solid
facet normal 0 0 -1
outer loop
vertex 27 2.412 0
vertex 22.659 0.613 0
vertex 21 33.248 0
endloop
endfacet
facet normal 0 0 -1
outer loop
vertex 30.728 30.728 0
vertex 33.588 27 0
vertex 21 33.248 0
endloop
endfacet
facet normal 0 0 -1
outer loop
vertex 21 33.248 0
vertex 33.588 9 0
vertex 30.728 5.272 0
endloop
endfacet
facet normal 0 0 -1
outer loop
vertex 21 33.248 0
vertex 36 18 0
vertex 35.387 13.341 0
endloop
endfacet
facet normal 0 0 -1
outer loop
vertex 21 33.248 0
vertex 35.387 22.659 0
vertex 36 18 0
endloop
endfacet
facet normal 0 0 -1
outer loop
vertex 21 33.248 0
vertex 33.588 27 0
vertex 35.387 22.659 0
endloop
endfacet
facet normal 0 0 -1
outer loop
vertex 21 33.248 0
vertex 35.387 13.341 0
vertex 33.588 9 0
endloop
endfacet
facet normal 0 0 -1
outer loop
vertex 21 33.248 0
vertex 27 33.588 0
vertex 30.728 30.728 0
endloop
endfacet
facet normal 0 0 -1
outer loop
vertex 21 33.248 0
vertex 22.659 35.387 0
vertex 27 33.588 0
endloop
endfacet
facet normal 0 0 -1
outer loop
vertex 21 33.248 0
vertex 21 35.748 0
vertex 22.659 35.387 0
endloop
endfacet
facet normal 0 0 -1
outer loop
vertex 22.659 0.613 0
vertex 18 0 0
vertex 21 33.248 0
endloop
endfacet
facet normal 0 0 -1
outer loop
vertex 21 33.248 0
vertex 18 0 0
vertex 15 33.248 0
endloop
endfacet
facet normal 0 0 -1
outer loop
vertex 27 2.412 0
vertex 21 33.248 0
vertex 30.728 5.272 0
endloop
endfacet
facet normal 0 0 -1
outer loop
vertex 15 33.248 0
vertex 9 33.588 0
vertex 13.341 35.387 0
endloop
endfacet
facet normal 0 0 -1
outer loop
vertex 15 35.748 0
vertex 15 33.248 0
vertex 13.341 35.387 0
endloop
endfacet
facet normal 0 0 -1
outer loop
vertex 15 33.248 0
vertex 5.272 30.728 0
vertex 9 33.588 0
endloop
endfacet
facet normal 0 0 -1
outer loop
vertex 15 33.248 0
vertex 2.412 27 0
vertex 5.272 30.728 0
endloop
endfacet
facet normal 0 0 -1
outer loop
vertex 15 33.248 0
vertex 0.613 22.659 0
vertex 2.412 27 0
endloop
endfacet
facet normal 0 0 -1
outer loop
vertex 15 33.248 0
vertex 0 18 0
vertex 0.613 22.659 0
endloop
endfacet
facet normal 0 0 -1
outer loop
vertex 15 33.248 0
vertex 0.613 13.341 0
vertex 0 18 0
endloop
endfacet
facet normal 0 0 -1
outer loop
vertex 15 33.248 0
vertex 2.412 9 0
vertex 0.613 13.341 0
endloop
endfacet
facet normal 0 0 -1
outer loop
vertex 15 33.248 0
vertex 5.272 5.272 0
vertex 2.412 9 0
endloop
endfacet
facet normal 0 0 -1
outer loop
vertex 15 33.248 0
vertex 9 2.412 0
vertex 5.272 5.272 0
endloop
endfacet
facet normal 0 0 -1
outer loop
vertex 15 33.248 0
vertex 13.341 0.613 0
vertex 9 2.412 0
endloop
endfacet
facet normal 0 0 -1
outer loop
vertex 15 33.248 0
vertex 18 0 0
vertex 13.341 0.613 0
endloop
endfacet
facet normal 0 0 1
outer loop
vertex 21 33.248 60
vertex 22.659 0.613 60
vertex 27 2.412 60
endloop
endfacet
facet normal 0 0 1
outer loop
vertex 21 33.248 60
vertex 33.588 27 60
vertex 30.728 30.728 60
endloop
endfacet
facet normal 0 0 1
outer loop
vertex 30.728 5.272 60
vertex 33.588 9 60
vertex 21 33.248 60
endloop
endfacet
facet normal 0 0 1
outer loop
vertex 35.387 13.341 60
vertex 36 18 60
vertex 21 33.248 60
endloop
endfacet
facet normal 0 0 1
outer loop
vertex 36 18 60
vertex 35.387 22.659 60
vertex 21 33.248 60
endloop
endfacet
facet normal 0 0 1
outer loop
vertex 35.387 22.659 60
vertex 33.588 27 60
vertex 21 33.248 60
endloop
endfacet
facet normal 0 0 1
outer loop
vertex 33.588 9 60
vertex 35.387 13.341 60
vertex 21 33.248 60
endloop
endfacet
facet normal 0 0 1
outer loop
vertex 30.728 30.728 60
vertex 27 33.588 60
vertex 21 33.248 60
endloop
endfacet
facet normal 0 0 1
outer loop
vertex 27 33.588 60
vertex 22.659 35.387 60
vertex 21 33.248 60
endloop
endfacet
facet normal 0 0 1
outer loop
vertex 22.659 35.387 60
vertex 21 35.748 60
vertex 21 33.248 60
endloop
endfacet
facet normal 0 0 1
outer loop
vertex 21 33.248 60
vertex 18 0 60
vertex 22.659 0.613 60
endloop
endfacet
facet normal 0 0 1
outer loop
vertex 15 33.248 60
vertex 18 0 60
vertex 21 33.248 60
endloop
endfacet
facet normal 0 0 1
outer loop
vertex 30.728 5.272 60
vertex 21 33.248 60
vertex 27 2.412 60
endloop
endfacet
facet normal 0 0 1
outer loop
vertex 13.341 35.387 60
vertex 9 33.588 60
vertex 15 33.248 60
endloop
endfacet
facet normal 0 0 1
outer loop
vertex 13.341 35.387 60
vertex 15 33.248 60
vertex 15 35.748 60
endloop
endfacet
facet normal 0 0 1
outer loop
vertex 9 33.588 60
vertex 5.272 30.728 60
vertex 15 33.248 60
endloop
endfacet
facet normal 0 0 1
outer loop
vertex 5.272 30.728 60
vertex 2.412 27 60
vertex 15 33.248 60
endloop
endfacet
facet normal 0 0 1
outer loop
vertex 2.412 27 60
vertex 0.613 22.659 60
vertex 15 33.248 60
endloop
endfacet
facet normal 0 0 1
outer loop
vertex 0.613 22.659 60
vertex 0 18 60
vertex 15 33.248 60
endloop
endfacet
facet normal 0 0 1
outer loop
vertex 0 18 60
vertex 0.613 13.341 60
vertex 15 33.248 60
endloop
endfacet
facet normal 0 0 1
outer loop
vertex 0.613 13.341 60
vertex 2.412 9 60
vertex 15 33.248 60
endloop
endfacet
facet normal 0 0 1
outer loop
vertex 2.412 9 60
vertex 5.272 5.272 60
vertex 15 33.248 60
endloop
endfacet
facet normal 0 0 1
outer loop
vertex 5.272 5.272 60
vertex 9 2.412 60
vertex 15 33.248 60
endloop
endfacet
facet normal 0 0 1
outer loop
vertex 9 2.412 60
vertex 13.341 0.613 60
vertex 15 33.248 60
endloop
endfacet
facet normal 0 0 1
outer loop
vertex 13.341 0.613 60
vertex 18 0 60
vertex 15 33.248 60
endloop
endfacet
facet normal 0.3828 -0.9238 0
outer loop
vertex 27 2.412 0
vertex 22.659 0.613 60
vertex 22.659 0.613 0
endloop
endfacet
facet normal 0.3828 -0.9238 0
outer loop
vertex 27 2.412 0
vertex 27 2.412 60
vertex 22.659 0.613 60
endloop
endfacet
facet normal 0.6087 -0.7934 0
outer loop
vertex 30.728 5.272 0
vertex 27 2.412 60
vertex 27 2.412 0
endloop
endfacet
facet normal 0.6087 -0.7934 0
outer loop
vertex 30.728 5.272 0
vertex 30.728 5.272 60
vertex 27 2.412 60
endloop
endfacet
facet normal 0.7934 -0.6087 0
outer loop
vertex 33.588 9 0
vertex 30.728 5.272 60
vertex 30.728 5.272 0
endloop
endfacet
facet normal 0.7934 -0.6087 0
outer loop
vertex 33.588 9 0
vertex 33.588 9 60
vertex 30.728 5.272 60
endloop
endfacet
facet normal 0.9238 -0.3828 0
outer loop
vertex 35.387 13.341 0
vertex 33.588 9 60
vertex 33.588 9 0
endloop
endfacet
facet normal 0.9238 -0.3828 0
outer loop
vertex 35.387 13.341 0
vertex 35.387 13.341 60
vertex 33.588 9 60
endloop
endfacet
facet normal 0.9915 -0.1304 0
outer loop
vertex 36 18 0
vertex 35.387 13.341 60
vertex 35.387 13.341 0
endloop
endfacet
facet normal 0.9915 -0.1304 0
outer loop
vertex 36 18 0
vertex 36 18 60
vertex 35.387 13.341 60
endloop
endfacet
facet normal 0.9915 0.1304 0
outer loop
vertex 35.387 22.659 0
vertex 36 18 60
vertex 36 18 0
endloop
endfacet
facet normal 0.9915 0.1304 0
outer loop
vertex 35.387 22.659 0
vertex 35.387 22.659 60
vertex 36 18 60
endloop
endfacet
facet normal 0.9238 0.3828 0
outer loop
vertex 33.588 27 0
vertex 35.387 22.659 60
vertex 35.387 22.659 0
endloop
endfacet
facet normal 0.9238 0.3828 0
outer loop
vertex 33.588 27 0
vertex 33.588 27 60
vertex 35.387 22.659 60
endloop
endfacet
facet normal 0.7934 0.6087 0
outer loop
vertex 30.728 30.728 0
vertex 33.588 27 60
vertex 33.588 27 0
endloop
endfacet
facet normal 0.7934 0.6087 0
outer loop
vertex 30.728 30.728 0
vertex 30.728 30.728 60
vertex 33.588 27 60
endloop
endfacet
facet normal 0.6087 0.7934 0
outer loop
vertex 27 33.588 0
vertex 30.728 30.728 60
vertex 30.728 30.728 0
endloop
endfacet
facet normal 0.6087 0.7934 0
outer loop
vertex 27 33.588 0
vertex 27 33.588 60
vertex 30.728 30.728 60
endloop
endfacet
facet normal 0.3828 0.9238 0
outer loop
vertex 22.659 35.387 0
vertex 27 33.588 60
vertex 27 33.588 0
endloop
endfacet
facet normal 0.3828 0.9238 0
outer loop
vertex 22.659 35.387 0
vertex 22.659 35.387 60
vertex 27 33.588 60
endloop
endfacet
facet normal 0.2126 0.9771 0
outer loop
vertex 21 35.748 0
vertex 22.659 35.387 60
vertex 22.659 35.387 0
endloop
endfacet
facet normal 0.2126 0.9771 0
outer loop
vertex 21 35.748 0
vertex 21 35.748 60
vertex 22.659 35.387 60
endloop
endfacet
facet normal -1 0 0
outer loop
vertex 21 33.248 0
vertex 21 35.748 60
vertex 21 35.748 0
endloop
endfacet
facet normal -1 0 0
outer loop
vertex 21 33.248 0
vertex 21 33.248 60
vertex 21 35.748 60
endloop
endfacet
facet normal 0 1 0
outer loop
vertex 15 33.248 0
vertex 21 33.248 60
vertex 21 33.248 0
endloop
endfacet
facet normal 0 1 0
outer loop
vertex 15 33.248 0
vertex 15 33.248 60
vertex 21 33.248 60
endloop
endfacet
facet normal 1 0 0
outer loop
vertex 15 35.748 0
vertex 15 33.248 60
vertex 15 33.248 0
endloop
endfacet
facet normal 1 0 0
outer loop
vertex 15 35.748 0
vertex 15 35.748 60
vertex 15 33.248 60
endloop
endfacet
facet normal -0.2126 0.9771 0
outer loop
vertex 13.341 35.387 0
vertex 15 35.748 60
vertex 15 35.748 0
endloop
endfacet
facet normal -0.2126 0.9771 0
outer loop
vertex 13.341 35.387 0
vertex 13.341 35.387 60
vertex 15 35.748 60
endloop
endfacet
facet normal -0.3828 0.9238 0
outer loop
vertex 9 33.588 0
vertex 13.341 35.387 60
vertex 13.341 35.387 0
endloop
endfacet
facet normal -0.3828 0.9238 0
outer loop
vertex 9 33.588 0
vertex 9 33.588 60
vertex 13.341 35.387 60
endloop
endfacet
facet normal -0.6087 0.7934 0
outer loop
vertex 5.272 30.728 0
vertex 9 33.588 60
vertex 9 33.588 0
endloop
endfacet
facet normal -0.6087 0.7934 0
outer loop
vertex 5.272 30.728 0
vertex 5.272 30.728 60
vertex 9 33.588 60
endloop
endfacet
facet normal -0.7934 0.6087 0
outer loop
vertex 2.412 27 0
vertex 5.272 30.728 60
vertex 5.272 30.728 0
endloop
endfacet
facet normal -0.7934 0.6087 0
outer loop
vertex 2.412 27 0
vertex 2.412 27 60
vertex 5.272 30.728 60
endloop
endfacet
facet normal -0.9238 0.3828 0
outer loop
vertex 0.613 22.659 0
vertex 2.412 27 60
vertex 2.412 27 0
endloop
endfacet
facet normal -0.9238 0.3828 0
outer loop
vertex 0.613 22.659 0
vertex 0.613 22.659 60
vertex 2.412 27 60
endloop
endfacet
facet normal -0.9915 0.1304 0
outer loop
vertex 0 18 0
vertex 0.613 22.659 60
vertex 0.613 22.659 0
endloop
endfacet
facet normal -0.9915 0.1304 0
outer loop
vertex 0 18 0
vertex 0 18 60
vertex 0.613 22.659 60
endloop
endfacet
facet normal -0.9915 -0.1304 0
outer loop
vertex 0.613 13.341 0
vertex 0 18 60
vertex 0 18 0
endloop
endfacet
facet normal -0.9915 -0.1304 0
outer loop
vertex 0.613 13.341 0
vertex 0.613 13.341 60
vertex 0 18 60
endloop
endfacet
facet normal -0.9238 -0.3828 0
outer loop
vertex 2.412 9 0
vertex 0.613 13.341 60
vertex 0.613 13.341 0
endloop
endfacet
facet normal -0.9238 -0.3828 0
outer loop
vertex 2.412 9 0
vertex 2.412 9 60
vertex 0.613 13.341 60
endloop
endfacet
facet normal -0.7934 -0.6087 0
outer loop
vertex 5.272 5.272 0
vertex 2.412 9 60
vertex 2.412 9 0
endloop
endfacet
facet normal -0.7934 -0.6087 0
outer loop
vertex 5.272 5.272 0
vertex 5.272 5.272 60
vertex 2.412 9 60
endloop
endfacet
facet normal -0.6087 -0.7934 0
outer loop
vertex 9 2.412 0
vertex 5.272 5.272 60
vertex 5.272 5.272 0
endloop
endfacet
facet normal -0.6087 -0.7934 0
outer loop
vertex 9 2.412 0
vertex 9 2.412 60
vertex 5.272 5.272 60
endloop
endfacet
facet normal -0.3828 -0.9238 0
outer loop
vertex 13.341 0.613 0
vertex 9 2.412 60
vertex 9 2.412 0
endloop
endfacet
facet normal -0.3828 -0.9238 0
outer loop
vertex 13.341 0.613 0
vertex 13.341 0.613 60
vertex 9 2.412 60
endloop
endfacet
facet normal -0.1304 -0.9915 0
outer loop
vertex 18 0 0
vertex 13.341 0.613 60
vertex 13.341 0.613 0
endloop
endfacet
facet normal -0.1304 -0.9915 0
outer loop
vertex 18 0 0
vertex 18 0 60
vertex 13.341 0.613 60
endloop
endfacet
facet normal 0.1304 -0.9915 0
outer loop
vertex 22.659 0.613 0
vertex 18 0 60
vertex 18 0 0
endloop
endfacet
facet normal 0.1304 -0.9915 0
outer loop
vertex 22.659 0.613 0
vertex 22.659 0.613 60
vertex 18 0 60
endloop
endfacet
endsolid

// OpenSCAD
$fn = 32;

// ----------------------------------------------------------------------
// Keyway shaft: d36 shaft, key 6 x 2.5 mm
// ----------------------------------------------------------------------

// --- parameters (mm) ---
shaft_r = 18;             // shaft radius
key_w = 6;                // keyway width
key_d = 2.5;              // keyway depth below the surface line
plate_t = 60;             // shaft length, Z (extrusion height)

shaft_d = 2 * shaft_r;  // shaft diameter
circle_step = 15;  // polygon sampling step, degrees

profile = [[13.341, 35.387], [9, 33.588], [5.272, 30.728], [2.412, 27], [0.613, 22.659], [0, 18], [0.613, 13.341], [2.412, 9], [5.272, 5.272], [9, 2.412], [13.341, 0.613], [18, 0], [22.659, 0.613], [27, 2.412], [30.728, 5.272], [33.588, 9], [35.387, 13.341], [36, 18], [35.387, 22.659], [33.588, 27], [30.728, 30.728], [27, 33.588], [22.659, 35.387], [21, 35.748], [21, 33.248], [15, 33.248], [15, 35.748]];  // primary outline, 27 points, counter clockwise

// --- the one profile operation ---
linear_extrude(height = plate_t) polygon(points = profile);
